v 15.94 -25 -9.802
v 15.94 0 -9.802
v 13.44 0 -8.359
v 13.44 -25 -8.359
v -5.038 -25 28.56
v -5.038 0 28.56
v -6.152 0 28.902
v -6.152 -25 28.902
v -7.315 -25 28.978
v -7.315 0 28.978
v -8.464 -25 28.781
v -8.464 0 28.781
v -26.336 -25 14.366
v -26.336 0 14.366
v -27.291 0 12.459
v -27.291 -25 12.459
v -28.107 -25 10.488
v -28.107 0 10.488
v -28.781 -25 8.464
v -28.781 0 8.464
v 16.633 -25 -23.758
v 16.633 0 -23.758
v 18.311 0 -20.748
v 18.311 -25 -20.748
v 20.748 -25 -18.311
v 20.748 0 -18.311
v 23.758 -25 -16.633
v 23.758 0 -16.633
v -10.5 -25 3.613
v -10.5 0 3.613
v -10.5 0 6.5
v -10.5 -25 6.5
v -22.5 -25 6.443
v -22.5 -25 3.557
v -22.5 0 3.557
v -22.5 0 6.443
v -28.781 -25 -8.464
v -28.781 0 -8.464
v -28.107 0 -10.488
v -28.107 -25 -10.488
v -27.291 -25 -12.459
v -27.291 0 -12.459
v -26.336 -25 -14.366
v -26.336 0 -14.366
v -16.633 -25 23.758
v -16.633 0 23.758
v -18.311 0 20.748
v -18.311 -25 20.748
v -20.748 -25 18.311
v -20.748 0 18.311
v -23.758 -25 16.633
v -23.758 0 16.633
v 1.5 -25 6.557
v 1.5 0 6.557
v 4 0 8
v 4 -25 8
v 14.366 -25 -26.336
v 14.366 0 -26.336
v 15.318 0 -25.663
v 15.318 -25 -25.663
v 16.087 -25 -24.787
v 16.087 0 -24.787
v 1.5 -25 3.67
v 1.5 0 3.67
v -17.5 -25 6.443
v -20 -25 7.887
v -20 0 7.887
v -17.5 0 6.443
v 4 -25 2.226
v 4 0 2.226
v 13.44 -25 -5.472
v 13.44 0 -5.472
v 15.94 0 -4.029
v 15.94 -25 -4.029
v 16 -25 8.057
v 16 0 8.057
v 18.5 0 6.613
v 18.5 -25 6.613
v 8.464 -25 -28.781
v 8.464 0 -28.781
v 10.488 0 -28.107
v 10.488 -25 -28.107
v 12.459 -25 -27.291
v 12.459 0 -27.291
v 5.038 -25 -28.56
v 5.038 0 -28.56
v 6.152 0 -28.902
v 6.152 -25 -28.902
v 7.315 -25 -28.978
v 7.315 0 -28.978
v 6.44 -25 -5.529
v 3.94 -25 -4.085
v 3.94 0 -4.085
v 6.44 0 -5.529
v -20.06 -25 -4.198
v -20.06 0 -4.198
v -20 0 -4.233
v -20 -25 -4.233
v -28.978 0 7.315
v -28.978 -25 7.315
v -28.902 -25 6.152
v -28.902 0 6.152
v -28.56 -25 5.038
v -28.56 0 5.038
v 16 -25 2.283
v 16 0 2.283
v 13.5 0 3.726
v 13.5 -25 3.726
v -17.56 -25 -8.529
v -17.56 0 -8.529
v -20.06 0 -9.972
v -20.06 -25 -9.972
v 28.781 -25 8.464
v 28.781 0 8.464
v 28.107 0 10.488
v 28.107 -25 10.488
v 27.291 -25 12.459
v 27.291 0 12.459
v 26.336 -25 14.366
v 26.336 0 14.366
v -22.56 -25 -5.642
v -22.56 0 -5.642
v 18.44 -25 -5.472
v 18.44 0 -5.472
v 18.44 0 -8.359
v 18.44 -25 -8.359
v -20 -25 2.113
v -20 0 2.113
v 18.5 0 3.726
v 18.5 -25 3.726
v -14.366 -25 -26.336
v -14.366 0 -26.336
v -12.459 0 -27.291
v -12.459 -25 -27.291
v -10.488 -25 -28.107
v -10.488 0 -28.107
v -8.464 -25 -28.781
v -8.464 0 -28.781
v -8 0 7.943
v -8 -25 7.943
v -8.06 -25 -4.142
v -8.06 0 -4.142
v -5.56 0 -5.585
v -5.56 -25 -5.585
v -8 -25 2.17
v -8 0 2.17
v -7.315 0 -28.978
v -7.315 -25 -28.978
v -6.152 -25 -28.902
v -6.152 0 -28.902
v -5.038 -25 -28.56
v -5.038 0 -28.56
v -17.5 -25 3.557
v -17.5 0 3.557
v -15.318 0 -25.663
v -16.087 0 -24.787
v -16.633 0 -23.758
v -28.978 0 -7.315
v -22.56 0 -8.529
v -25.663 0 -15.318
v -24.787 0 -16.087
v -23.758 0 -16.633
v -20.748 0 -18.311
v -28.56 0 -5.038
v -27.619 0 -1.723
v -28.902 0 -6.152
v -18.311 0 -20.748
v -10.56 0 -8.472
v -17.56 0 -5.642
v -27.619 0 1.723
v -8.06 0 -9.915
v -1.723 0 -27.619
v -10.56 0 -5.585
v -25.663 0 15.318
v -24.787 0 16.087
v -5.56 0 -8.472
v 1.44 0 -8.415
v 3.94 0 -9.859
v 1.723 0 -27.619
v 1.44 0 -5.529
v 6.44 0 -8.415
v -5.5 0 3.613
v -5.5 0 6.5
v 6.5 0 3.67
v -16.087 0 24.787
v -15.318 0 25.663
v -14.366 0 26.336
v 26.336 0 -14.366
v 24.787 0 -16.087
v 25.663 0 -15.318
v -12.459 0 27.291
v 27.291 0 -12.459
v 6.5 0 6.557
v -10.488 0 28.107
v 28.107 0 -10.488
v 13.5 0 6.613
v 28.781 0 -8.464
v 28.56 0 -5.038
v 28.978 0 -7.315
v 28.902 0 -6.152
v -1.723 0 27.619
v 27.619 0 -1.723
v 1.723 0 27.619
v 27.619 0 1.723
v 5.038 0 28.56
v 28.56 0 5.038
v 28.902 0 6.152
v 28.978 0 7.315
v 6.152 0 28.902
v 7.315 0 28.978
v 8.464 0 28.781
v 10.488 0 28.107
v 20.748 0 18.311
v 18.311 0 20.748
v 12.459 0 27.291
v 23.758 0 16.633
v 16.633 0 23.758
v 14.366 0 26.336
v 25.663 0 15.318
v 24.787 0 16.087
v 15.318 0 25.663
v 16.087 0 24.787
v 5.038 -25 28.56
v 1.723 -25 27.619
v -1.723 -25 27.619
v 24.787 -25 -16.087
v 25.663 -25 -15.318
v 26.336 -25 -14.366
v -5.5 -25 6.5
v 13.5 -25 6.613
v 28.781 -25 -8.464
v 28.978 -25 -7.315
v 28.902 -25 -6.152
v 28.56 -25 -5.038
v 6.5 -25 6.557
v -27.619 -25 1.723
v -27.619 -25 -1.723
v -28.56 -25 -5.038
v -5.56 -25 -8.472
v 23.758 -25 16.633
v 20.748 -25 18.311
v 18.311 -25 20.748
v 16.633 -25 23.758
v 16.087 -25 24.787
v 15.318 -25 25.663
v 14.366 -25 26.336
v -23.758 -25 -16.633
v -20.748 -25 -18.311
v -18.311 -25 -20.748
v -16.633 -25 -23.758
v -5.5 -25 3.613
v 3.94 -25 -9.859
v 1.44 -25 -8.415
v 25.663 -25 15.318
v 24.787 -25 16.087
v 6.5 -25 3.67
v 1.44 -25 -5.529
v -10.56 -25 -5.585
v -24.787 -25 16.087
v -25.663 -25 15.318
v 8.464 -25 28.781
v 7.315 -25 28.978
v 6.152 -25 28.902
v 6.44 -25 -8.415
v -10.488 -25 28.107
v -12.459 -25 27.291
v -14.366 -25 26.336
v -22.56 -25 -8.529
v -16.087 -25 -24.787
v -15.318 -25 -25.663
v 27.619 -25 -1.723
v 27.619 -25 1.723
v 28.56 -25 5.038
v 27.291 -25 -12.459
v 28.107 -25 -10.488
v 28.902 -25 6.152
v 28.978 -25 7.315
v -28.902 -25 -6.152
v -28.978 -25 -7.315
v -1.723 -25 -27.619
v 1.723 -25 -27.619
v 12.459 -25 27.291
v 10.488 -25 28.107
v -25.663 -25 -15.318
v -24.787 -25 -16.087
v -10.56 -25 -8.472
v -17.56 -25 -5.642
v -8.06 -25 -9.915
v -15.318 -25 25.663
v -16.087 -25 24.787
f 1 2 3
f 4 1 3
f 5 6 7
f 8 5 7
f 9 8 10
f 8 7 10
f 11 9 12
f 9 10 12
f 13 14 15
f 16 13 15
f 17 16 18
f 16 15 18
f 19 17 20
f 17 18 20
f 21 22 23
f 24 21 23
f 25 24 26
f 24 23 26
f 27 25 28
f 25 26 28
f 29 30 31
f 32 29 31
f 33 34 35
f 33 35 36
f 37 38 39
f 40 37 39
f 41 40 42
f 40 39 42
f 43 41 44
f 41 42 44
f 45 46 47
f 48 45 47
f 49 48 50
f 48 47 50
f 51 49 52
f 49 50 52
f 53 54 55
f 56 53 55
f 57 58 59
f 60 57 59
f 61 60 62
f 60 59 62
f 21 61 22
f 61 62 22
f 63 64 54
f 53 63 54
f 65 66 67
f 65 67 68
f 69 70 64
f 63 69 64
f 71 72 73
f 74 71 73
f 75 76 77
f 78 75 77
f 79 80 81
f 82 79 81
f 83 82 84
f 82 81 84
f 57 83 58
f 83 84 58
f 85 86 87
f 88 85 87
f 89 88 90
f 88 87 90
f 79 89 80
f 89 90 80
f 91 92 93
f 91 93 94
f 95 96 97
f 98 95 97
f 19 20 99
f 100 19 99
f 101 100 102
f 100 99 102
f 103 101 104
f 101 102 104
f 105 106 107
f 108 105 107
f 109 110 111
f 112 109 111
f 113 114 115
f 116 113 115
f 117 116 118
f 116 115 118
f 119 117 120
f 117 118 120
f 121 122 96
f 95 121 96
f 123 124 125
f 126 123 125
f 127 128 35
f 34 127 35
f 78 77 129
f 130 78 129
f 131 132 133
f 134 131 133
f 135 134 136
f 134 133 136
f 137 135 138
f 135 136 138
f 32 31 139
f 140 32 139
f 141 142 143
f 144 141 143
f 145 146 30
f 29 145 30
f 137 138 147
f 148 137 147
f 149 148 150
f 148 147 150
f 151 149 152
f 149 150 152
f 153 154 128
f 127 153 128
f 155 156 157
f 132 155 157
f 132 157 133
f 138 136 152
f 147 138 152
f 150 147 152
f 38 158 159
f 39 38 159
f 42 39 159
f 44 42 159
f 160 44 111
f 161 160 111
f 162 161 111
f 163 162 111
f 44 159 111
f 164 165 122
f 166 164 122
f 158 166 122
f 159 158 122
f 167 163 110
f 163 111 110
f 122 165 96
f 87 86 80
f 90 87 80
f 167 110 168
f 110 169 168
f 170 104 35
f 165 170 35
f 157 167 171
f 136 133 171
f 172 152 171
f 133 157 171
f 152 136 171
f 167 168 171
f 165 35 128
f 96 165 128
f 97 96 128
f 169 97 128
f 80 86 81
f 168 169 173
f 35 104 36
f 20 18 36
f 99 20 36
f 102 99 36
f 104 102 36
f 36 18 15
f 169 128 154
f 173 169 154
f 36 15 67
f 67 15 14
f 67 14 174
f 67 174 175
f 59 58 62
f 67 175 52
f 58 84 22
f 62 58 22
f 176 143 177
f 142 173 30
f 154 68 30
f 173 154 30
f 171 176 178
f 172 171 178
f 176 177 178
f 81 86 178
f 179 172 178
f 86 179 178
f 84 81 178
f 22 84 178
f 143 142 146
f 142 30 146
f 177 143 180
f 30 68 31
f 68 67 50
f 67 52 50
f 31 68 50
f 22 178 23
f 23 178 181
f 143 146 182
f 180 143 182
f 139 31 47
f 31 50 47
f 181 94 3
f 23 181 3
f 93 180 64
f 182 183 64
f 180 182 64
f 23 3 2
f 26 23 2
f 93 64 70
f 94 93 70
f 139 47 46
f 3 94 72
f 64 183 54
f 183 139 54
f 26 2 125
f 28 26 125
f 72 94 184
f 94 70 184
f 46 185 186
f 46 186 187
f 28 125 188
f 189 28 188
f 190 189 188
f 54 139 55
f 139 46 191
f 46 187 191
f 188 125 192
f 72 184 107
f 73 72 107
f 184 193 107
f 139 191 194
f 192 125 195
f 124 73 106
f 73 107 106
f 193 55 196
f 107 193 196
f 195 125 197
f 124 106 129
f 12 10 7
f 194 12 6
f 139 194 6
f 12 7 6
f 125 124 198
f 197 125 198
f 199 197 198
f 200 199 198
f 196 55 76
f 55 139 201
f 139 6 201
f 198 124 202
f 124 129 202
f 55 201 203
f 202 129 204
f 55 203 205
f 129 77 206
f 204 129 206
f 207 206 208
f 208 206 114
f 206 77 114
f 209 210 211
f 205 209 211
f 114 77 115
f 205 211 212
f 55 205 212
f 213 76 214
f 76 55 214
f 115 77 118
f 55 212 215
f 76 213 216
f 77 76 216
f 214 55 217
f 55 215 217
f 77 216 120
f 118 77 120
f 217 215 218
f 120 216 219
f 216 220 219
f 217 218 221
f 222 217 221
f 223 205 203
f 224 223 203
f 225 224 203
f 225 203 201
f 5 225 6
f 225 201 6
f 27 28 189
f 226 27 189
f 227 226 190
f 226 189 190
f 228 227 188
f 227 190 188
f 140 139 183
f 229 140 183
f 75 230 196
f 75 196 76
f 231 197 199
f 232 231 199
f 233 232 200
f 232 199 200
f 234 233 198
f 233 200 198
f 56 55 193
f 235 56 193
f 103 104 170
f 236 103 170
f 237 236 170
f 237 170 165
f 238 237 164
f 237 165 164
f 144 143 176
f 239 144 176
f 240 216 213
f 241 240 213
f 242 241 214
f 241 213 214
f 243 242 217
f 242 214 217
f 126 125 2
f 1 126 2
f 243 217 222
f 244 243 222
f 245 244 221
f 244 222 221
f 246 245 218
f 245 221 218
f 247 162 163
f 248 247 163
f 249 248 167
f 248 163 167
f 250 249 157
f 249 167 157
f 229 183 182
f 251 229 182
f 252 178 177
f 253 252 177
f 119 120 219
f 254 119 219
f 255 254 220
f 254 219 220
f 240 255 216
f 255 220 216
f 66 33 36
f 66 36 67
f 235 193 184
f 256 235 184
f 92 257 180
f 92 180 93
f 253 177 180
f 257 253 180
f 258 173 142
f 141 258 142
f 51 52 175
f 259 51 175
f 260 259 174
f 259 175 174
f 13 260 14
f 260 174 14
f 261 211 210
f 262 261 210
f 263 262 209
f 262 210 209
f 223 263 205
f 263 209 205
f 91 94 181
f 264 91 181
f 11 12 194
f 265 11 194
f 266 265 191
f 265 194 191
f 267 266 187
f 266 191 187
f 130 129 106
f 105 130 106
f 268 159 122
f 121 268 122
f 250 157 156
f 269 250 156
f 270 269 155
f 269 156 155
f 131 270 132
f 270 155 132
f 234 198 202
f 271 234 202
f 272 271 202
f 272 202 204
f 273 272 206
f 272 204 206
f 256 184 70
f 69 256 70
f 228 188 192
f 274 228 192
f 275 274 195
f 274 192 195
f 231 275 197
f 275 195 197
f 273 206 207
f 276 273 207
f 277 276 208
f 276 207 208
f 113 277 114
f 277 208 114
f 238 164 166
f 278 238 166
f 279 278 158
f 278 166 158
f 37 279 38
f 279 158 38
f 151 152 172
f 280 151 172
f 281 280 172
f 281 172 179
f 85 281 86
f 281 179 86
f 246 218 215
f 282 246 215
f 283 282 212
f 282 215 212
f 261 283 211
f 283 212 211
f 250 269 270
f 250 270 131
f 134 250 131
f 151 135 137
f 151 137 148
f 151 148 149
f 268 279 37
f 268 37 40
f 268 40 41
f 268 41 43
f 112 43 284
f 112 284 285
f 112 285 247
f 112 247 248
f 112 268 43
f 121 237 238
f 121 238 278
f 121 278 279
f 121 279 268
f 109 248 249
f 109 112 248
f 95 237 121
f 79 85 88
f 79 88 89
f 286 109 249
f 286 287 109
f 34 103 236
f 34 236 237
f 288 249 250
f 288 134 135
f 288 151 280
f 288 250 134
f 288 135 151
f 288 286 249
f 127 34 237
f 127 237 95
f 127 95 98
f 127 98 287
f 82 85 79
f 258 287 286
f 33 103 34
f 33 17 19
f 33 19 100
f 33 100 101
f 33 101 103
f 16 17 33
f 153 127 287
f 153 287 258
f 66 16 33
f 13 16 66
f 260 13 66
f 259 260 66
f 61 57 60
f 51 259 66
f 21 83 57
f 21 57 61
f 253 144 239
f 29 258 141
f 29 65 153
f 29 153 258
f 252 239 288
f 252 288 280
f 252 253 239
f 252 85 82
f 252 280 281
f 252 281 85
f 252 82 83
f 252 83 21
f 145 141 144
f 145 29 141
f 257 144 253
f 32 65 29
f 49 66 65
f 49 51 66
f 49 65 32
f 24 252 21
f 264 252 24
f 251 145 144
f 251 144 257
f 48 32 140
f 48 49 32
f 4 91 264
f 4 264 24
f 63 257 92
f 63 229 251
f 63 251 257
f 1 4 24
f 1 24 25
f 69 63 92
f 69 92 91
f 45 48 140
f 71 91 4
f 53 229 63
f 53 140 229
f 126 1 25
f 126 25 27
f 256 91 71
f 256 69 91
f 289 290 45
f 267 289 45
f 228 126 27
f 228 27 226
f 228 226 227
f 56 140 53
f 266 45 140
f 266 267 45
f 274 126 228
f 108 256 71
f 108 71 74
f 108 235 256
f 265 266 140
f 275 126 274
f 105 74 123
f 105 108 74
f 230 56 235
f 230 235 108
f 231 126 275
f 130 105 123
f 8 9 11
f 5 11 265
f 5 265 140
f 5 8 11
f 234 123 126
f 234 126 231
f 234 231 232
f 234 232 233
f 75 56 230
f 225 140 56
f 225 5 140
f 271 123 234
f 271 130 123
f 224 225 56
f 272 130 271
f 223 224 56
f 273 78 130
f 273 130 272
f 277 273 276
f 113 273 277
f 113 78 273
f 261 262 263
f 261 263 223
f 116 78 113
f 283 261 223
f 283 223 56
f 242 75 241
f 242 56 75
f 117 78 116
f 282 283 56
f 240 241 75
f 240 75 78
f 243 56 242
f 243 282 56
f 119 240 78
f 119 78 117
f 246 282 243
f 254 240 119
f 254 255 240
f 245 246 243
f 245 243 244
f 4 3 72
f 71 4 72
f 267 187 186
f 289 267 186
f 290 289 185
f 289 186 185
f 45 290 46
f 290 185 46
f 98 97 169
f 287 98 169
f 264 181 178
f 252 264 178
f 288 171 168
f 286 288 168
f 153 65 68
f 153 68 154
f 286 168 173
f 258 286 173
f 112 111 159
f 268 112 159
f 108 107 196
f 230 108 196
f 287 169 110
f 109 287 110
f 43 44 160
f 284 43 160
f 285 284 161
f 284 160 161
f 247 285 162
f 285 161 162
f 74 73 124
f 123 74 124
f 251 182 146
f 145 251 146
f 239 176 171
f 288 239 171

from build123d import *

# Parameters (mm, degrees)
F1_DEPTH = 25


with BuildPart() as f1:
    # F0 (on Front) → F1 (new body)
    with BuildSketch(Plane.XZ):
        with BuildLine():
            ThreePointArc((-5.038108, 28.560268), (-6.731504, 28.974006), (-8.464021, 28.78125))
            ThreePointArc((-8.464021, 28.78125), (-11.480503, 27.716386), (-14.366451, 26.336384))
            ThreePointArc((-14.366451, 26.336384), (-15.727824, 25.247608), (-16.632679, 23.757639))
            ThreePointArc((-16.632679, 23.757639), (-19.445436, 19.445436), (-23.757639, 16.632679))
            ThreePointArc((-23.757639, 16.632679), (-25.247608, 15.727824), (-26.336384, 14.366451))
            ThreePointArc((-26.336384, 14.366451), (-27.716386, 11.480503), (-28.78125, 8.464021))
            ThreePointArc((-28.78125, 8.464021), (-28.974006, 6.731504), (-28.560268, 5.038108))
            ThreePointArc((-28.560268, 5.038108), (-27.5, 0), (-28.560268, -5.038108))
            ThreePointArc((-28.560268, -5.038108), (-28.974006, -6.731504), (-28.78125, -8.464021))
            ThreePointArc((-28.78125, -8.464021), (-27.716386, -11.480503), (-26.336384, -14.366451))
            ThreePointArc((-26.336384, -14.366451), (-25.247608, -15.727824), (-23.757639, -16.632679))
            ThreePointArc((-23.757639, -16.632679), (-19.445436, -19.445436), (-16.632679, -23.757639))
            ThreePointArc((-16.632679, -23.757639), (-15.727824, -25.247608), (-14.366451, -26.336384))
            ThreePointArc((-14.366451, -26.336384), (-11.480503, -27.716386), (-8.464021, -28.78125))
            ThreePointArc((-8.464021, -28.78125), (-6.731504, -28.974006), (-5.038108, -28.560268))
            ThreePointArc((-5.038108, -28.560268), (0, -27.5), (5.038108, -28.560268))
            ThreePointArc((5.038108, -28.560268), (6.731504, -28.974006), (8.464021, -28.78125))
            ThreePointArc((8.464021, -28.78125), (11.480503, -27.716386), (14.366451, -26.336384))
            ThreePointArc((14.366451, -26.336384), (15.727824, -25.247608), (16.632679, -23.757639))
            ThreePointArc((16.632679, -23.757639), (19.445436, -19.445436), (23.757639, -16.632679))
            ThreePointArc((23.757639, -16.632679), (25.247608, -15.727824), (26.336384, -14.366451))
            ThreePointArc((26.336384, -14.366451), (27.716386, -11.480503), (28.78125, -8.464021))
            ThreePointArc((28.78125, -8.464021), (28.974006, -6.731504), (28.560268, -5.038108))
            ThreePointArc((28.560268, -5.038108), (27.5, 0), (28.560268, 5.038108))
            ThreePointArc((28.560268, 5.038108), (28.974006, 6.731504), (28.78125, 8.464021))
            ThreePointArc((28.78125, 8.464021), (27.716386, 11.480503), (26.336384, 14.366451))
            ThreePointArc((26.336384, 14.366451), (25.247608, 15.727824), (23.757639, 16.632679))
            ThreePointArc((23.757639, 16.632679), (19.445436, 19.445436), (16.632679, 23.757639))
            ThreePointArc((16.632679, 23.757639), (15.727824, 25.247608), (14.366451, 26.336384))
            ThreePointArc((14.366451, 26.336384), (11.480503, 27.716386), (8.464021, 28.78125))
            ThreePointArc((8.464021, 28.78125), (6.731504, 28.974006), (5.038108, 28.560268))
            ThreePointArc((5.038108, 28.560268), (0, 27.5), (-5.038108, 28.560268))
        make_face()
        Polygon((-20.06, -4.198434), (-20, -4.233075), (-17.56, -5.64181), (-17.56, -7), (-17.56, -8.528561), (-20.06, -9.971937), (-22.56, -8.528561), (-22.56, -5.64181), align=None, mode=Mode.SUBTRACT)
        Polygon((-8.06, -9.915313), (-10.56, -8.471937), (-10.56, -5.585186), (-8.06, -4.14181), (-5.56, -5.585186), (-5.56, -8.471937), align=None, mode=Mode.SUBTRACT)
        Polygon((6.44, -8.415313), (3.94, -9.858688), (1.44, -8.415313), (1.44, -5.528561), (3.94, -4.085186), (6.44, -5.528561), align=None, mode=Mode.SUBTRACT)
        Polygon((13.44, -8.358688), (13.44, -5.471937), (15.94, -4.028561), (18.44, -5.471937), (18.44, -8.358688), (15.94, -9.802064), align=None, mode=Mode.SUBTRACT)
        Polygon((-17.5, 6.443376), (-17.5, 3.556624), (-20, 2.113249), (-22.5, 3.556624), (-22.5, 6.443376), (-20, 7.886751), align=None, mode=Mode.SUBTRACT)
        Polygon((-10.5, 3.613249), (-10.5, 6.5), (-8, 7.943376), (-5.5, 6.5), (-5.5, 3.613249), (-8, 2.169873), align=None, mode=Mode.SUBTRACT)
        Polygon((1.5, 3.669873), (1.5, 6.556624), (4, 8), (6.5, 6.556624), (6.5, 3.669873), (4, 2.226497), align=None, mode=Mode.SUBTRACT)
        Polygon((13.5, 3.726497), (13.5, 6.613249), (16, 8.056624), (18.5, 6.613249), (18.5, 3.726497), (16, 2.283122), align=None, mode=Mode.SUBTRACT)
    extrude(amount=F1_DEPTH)


solid = f1.part
